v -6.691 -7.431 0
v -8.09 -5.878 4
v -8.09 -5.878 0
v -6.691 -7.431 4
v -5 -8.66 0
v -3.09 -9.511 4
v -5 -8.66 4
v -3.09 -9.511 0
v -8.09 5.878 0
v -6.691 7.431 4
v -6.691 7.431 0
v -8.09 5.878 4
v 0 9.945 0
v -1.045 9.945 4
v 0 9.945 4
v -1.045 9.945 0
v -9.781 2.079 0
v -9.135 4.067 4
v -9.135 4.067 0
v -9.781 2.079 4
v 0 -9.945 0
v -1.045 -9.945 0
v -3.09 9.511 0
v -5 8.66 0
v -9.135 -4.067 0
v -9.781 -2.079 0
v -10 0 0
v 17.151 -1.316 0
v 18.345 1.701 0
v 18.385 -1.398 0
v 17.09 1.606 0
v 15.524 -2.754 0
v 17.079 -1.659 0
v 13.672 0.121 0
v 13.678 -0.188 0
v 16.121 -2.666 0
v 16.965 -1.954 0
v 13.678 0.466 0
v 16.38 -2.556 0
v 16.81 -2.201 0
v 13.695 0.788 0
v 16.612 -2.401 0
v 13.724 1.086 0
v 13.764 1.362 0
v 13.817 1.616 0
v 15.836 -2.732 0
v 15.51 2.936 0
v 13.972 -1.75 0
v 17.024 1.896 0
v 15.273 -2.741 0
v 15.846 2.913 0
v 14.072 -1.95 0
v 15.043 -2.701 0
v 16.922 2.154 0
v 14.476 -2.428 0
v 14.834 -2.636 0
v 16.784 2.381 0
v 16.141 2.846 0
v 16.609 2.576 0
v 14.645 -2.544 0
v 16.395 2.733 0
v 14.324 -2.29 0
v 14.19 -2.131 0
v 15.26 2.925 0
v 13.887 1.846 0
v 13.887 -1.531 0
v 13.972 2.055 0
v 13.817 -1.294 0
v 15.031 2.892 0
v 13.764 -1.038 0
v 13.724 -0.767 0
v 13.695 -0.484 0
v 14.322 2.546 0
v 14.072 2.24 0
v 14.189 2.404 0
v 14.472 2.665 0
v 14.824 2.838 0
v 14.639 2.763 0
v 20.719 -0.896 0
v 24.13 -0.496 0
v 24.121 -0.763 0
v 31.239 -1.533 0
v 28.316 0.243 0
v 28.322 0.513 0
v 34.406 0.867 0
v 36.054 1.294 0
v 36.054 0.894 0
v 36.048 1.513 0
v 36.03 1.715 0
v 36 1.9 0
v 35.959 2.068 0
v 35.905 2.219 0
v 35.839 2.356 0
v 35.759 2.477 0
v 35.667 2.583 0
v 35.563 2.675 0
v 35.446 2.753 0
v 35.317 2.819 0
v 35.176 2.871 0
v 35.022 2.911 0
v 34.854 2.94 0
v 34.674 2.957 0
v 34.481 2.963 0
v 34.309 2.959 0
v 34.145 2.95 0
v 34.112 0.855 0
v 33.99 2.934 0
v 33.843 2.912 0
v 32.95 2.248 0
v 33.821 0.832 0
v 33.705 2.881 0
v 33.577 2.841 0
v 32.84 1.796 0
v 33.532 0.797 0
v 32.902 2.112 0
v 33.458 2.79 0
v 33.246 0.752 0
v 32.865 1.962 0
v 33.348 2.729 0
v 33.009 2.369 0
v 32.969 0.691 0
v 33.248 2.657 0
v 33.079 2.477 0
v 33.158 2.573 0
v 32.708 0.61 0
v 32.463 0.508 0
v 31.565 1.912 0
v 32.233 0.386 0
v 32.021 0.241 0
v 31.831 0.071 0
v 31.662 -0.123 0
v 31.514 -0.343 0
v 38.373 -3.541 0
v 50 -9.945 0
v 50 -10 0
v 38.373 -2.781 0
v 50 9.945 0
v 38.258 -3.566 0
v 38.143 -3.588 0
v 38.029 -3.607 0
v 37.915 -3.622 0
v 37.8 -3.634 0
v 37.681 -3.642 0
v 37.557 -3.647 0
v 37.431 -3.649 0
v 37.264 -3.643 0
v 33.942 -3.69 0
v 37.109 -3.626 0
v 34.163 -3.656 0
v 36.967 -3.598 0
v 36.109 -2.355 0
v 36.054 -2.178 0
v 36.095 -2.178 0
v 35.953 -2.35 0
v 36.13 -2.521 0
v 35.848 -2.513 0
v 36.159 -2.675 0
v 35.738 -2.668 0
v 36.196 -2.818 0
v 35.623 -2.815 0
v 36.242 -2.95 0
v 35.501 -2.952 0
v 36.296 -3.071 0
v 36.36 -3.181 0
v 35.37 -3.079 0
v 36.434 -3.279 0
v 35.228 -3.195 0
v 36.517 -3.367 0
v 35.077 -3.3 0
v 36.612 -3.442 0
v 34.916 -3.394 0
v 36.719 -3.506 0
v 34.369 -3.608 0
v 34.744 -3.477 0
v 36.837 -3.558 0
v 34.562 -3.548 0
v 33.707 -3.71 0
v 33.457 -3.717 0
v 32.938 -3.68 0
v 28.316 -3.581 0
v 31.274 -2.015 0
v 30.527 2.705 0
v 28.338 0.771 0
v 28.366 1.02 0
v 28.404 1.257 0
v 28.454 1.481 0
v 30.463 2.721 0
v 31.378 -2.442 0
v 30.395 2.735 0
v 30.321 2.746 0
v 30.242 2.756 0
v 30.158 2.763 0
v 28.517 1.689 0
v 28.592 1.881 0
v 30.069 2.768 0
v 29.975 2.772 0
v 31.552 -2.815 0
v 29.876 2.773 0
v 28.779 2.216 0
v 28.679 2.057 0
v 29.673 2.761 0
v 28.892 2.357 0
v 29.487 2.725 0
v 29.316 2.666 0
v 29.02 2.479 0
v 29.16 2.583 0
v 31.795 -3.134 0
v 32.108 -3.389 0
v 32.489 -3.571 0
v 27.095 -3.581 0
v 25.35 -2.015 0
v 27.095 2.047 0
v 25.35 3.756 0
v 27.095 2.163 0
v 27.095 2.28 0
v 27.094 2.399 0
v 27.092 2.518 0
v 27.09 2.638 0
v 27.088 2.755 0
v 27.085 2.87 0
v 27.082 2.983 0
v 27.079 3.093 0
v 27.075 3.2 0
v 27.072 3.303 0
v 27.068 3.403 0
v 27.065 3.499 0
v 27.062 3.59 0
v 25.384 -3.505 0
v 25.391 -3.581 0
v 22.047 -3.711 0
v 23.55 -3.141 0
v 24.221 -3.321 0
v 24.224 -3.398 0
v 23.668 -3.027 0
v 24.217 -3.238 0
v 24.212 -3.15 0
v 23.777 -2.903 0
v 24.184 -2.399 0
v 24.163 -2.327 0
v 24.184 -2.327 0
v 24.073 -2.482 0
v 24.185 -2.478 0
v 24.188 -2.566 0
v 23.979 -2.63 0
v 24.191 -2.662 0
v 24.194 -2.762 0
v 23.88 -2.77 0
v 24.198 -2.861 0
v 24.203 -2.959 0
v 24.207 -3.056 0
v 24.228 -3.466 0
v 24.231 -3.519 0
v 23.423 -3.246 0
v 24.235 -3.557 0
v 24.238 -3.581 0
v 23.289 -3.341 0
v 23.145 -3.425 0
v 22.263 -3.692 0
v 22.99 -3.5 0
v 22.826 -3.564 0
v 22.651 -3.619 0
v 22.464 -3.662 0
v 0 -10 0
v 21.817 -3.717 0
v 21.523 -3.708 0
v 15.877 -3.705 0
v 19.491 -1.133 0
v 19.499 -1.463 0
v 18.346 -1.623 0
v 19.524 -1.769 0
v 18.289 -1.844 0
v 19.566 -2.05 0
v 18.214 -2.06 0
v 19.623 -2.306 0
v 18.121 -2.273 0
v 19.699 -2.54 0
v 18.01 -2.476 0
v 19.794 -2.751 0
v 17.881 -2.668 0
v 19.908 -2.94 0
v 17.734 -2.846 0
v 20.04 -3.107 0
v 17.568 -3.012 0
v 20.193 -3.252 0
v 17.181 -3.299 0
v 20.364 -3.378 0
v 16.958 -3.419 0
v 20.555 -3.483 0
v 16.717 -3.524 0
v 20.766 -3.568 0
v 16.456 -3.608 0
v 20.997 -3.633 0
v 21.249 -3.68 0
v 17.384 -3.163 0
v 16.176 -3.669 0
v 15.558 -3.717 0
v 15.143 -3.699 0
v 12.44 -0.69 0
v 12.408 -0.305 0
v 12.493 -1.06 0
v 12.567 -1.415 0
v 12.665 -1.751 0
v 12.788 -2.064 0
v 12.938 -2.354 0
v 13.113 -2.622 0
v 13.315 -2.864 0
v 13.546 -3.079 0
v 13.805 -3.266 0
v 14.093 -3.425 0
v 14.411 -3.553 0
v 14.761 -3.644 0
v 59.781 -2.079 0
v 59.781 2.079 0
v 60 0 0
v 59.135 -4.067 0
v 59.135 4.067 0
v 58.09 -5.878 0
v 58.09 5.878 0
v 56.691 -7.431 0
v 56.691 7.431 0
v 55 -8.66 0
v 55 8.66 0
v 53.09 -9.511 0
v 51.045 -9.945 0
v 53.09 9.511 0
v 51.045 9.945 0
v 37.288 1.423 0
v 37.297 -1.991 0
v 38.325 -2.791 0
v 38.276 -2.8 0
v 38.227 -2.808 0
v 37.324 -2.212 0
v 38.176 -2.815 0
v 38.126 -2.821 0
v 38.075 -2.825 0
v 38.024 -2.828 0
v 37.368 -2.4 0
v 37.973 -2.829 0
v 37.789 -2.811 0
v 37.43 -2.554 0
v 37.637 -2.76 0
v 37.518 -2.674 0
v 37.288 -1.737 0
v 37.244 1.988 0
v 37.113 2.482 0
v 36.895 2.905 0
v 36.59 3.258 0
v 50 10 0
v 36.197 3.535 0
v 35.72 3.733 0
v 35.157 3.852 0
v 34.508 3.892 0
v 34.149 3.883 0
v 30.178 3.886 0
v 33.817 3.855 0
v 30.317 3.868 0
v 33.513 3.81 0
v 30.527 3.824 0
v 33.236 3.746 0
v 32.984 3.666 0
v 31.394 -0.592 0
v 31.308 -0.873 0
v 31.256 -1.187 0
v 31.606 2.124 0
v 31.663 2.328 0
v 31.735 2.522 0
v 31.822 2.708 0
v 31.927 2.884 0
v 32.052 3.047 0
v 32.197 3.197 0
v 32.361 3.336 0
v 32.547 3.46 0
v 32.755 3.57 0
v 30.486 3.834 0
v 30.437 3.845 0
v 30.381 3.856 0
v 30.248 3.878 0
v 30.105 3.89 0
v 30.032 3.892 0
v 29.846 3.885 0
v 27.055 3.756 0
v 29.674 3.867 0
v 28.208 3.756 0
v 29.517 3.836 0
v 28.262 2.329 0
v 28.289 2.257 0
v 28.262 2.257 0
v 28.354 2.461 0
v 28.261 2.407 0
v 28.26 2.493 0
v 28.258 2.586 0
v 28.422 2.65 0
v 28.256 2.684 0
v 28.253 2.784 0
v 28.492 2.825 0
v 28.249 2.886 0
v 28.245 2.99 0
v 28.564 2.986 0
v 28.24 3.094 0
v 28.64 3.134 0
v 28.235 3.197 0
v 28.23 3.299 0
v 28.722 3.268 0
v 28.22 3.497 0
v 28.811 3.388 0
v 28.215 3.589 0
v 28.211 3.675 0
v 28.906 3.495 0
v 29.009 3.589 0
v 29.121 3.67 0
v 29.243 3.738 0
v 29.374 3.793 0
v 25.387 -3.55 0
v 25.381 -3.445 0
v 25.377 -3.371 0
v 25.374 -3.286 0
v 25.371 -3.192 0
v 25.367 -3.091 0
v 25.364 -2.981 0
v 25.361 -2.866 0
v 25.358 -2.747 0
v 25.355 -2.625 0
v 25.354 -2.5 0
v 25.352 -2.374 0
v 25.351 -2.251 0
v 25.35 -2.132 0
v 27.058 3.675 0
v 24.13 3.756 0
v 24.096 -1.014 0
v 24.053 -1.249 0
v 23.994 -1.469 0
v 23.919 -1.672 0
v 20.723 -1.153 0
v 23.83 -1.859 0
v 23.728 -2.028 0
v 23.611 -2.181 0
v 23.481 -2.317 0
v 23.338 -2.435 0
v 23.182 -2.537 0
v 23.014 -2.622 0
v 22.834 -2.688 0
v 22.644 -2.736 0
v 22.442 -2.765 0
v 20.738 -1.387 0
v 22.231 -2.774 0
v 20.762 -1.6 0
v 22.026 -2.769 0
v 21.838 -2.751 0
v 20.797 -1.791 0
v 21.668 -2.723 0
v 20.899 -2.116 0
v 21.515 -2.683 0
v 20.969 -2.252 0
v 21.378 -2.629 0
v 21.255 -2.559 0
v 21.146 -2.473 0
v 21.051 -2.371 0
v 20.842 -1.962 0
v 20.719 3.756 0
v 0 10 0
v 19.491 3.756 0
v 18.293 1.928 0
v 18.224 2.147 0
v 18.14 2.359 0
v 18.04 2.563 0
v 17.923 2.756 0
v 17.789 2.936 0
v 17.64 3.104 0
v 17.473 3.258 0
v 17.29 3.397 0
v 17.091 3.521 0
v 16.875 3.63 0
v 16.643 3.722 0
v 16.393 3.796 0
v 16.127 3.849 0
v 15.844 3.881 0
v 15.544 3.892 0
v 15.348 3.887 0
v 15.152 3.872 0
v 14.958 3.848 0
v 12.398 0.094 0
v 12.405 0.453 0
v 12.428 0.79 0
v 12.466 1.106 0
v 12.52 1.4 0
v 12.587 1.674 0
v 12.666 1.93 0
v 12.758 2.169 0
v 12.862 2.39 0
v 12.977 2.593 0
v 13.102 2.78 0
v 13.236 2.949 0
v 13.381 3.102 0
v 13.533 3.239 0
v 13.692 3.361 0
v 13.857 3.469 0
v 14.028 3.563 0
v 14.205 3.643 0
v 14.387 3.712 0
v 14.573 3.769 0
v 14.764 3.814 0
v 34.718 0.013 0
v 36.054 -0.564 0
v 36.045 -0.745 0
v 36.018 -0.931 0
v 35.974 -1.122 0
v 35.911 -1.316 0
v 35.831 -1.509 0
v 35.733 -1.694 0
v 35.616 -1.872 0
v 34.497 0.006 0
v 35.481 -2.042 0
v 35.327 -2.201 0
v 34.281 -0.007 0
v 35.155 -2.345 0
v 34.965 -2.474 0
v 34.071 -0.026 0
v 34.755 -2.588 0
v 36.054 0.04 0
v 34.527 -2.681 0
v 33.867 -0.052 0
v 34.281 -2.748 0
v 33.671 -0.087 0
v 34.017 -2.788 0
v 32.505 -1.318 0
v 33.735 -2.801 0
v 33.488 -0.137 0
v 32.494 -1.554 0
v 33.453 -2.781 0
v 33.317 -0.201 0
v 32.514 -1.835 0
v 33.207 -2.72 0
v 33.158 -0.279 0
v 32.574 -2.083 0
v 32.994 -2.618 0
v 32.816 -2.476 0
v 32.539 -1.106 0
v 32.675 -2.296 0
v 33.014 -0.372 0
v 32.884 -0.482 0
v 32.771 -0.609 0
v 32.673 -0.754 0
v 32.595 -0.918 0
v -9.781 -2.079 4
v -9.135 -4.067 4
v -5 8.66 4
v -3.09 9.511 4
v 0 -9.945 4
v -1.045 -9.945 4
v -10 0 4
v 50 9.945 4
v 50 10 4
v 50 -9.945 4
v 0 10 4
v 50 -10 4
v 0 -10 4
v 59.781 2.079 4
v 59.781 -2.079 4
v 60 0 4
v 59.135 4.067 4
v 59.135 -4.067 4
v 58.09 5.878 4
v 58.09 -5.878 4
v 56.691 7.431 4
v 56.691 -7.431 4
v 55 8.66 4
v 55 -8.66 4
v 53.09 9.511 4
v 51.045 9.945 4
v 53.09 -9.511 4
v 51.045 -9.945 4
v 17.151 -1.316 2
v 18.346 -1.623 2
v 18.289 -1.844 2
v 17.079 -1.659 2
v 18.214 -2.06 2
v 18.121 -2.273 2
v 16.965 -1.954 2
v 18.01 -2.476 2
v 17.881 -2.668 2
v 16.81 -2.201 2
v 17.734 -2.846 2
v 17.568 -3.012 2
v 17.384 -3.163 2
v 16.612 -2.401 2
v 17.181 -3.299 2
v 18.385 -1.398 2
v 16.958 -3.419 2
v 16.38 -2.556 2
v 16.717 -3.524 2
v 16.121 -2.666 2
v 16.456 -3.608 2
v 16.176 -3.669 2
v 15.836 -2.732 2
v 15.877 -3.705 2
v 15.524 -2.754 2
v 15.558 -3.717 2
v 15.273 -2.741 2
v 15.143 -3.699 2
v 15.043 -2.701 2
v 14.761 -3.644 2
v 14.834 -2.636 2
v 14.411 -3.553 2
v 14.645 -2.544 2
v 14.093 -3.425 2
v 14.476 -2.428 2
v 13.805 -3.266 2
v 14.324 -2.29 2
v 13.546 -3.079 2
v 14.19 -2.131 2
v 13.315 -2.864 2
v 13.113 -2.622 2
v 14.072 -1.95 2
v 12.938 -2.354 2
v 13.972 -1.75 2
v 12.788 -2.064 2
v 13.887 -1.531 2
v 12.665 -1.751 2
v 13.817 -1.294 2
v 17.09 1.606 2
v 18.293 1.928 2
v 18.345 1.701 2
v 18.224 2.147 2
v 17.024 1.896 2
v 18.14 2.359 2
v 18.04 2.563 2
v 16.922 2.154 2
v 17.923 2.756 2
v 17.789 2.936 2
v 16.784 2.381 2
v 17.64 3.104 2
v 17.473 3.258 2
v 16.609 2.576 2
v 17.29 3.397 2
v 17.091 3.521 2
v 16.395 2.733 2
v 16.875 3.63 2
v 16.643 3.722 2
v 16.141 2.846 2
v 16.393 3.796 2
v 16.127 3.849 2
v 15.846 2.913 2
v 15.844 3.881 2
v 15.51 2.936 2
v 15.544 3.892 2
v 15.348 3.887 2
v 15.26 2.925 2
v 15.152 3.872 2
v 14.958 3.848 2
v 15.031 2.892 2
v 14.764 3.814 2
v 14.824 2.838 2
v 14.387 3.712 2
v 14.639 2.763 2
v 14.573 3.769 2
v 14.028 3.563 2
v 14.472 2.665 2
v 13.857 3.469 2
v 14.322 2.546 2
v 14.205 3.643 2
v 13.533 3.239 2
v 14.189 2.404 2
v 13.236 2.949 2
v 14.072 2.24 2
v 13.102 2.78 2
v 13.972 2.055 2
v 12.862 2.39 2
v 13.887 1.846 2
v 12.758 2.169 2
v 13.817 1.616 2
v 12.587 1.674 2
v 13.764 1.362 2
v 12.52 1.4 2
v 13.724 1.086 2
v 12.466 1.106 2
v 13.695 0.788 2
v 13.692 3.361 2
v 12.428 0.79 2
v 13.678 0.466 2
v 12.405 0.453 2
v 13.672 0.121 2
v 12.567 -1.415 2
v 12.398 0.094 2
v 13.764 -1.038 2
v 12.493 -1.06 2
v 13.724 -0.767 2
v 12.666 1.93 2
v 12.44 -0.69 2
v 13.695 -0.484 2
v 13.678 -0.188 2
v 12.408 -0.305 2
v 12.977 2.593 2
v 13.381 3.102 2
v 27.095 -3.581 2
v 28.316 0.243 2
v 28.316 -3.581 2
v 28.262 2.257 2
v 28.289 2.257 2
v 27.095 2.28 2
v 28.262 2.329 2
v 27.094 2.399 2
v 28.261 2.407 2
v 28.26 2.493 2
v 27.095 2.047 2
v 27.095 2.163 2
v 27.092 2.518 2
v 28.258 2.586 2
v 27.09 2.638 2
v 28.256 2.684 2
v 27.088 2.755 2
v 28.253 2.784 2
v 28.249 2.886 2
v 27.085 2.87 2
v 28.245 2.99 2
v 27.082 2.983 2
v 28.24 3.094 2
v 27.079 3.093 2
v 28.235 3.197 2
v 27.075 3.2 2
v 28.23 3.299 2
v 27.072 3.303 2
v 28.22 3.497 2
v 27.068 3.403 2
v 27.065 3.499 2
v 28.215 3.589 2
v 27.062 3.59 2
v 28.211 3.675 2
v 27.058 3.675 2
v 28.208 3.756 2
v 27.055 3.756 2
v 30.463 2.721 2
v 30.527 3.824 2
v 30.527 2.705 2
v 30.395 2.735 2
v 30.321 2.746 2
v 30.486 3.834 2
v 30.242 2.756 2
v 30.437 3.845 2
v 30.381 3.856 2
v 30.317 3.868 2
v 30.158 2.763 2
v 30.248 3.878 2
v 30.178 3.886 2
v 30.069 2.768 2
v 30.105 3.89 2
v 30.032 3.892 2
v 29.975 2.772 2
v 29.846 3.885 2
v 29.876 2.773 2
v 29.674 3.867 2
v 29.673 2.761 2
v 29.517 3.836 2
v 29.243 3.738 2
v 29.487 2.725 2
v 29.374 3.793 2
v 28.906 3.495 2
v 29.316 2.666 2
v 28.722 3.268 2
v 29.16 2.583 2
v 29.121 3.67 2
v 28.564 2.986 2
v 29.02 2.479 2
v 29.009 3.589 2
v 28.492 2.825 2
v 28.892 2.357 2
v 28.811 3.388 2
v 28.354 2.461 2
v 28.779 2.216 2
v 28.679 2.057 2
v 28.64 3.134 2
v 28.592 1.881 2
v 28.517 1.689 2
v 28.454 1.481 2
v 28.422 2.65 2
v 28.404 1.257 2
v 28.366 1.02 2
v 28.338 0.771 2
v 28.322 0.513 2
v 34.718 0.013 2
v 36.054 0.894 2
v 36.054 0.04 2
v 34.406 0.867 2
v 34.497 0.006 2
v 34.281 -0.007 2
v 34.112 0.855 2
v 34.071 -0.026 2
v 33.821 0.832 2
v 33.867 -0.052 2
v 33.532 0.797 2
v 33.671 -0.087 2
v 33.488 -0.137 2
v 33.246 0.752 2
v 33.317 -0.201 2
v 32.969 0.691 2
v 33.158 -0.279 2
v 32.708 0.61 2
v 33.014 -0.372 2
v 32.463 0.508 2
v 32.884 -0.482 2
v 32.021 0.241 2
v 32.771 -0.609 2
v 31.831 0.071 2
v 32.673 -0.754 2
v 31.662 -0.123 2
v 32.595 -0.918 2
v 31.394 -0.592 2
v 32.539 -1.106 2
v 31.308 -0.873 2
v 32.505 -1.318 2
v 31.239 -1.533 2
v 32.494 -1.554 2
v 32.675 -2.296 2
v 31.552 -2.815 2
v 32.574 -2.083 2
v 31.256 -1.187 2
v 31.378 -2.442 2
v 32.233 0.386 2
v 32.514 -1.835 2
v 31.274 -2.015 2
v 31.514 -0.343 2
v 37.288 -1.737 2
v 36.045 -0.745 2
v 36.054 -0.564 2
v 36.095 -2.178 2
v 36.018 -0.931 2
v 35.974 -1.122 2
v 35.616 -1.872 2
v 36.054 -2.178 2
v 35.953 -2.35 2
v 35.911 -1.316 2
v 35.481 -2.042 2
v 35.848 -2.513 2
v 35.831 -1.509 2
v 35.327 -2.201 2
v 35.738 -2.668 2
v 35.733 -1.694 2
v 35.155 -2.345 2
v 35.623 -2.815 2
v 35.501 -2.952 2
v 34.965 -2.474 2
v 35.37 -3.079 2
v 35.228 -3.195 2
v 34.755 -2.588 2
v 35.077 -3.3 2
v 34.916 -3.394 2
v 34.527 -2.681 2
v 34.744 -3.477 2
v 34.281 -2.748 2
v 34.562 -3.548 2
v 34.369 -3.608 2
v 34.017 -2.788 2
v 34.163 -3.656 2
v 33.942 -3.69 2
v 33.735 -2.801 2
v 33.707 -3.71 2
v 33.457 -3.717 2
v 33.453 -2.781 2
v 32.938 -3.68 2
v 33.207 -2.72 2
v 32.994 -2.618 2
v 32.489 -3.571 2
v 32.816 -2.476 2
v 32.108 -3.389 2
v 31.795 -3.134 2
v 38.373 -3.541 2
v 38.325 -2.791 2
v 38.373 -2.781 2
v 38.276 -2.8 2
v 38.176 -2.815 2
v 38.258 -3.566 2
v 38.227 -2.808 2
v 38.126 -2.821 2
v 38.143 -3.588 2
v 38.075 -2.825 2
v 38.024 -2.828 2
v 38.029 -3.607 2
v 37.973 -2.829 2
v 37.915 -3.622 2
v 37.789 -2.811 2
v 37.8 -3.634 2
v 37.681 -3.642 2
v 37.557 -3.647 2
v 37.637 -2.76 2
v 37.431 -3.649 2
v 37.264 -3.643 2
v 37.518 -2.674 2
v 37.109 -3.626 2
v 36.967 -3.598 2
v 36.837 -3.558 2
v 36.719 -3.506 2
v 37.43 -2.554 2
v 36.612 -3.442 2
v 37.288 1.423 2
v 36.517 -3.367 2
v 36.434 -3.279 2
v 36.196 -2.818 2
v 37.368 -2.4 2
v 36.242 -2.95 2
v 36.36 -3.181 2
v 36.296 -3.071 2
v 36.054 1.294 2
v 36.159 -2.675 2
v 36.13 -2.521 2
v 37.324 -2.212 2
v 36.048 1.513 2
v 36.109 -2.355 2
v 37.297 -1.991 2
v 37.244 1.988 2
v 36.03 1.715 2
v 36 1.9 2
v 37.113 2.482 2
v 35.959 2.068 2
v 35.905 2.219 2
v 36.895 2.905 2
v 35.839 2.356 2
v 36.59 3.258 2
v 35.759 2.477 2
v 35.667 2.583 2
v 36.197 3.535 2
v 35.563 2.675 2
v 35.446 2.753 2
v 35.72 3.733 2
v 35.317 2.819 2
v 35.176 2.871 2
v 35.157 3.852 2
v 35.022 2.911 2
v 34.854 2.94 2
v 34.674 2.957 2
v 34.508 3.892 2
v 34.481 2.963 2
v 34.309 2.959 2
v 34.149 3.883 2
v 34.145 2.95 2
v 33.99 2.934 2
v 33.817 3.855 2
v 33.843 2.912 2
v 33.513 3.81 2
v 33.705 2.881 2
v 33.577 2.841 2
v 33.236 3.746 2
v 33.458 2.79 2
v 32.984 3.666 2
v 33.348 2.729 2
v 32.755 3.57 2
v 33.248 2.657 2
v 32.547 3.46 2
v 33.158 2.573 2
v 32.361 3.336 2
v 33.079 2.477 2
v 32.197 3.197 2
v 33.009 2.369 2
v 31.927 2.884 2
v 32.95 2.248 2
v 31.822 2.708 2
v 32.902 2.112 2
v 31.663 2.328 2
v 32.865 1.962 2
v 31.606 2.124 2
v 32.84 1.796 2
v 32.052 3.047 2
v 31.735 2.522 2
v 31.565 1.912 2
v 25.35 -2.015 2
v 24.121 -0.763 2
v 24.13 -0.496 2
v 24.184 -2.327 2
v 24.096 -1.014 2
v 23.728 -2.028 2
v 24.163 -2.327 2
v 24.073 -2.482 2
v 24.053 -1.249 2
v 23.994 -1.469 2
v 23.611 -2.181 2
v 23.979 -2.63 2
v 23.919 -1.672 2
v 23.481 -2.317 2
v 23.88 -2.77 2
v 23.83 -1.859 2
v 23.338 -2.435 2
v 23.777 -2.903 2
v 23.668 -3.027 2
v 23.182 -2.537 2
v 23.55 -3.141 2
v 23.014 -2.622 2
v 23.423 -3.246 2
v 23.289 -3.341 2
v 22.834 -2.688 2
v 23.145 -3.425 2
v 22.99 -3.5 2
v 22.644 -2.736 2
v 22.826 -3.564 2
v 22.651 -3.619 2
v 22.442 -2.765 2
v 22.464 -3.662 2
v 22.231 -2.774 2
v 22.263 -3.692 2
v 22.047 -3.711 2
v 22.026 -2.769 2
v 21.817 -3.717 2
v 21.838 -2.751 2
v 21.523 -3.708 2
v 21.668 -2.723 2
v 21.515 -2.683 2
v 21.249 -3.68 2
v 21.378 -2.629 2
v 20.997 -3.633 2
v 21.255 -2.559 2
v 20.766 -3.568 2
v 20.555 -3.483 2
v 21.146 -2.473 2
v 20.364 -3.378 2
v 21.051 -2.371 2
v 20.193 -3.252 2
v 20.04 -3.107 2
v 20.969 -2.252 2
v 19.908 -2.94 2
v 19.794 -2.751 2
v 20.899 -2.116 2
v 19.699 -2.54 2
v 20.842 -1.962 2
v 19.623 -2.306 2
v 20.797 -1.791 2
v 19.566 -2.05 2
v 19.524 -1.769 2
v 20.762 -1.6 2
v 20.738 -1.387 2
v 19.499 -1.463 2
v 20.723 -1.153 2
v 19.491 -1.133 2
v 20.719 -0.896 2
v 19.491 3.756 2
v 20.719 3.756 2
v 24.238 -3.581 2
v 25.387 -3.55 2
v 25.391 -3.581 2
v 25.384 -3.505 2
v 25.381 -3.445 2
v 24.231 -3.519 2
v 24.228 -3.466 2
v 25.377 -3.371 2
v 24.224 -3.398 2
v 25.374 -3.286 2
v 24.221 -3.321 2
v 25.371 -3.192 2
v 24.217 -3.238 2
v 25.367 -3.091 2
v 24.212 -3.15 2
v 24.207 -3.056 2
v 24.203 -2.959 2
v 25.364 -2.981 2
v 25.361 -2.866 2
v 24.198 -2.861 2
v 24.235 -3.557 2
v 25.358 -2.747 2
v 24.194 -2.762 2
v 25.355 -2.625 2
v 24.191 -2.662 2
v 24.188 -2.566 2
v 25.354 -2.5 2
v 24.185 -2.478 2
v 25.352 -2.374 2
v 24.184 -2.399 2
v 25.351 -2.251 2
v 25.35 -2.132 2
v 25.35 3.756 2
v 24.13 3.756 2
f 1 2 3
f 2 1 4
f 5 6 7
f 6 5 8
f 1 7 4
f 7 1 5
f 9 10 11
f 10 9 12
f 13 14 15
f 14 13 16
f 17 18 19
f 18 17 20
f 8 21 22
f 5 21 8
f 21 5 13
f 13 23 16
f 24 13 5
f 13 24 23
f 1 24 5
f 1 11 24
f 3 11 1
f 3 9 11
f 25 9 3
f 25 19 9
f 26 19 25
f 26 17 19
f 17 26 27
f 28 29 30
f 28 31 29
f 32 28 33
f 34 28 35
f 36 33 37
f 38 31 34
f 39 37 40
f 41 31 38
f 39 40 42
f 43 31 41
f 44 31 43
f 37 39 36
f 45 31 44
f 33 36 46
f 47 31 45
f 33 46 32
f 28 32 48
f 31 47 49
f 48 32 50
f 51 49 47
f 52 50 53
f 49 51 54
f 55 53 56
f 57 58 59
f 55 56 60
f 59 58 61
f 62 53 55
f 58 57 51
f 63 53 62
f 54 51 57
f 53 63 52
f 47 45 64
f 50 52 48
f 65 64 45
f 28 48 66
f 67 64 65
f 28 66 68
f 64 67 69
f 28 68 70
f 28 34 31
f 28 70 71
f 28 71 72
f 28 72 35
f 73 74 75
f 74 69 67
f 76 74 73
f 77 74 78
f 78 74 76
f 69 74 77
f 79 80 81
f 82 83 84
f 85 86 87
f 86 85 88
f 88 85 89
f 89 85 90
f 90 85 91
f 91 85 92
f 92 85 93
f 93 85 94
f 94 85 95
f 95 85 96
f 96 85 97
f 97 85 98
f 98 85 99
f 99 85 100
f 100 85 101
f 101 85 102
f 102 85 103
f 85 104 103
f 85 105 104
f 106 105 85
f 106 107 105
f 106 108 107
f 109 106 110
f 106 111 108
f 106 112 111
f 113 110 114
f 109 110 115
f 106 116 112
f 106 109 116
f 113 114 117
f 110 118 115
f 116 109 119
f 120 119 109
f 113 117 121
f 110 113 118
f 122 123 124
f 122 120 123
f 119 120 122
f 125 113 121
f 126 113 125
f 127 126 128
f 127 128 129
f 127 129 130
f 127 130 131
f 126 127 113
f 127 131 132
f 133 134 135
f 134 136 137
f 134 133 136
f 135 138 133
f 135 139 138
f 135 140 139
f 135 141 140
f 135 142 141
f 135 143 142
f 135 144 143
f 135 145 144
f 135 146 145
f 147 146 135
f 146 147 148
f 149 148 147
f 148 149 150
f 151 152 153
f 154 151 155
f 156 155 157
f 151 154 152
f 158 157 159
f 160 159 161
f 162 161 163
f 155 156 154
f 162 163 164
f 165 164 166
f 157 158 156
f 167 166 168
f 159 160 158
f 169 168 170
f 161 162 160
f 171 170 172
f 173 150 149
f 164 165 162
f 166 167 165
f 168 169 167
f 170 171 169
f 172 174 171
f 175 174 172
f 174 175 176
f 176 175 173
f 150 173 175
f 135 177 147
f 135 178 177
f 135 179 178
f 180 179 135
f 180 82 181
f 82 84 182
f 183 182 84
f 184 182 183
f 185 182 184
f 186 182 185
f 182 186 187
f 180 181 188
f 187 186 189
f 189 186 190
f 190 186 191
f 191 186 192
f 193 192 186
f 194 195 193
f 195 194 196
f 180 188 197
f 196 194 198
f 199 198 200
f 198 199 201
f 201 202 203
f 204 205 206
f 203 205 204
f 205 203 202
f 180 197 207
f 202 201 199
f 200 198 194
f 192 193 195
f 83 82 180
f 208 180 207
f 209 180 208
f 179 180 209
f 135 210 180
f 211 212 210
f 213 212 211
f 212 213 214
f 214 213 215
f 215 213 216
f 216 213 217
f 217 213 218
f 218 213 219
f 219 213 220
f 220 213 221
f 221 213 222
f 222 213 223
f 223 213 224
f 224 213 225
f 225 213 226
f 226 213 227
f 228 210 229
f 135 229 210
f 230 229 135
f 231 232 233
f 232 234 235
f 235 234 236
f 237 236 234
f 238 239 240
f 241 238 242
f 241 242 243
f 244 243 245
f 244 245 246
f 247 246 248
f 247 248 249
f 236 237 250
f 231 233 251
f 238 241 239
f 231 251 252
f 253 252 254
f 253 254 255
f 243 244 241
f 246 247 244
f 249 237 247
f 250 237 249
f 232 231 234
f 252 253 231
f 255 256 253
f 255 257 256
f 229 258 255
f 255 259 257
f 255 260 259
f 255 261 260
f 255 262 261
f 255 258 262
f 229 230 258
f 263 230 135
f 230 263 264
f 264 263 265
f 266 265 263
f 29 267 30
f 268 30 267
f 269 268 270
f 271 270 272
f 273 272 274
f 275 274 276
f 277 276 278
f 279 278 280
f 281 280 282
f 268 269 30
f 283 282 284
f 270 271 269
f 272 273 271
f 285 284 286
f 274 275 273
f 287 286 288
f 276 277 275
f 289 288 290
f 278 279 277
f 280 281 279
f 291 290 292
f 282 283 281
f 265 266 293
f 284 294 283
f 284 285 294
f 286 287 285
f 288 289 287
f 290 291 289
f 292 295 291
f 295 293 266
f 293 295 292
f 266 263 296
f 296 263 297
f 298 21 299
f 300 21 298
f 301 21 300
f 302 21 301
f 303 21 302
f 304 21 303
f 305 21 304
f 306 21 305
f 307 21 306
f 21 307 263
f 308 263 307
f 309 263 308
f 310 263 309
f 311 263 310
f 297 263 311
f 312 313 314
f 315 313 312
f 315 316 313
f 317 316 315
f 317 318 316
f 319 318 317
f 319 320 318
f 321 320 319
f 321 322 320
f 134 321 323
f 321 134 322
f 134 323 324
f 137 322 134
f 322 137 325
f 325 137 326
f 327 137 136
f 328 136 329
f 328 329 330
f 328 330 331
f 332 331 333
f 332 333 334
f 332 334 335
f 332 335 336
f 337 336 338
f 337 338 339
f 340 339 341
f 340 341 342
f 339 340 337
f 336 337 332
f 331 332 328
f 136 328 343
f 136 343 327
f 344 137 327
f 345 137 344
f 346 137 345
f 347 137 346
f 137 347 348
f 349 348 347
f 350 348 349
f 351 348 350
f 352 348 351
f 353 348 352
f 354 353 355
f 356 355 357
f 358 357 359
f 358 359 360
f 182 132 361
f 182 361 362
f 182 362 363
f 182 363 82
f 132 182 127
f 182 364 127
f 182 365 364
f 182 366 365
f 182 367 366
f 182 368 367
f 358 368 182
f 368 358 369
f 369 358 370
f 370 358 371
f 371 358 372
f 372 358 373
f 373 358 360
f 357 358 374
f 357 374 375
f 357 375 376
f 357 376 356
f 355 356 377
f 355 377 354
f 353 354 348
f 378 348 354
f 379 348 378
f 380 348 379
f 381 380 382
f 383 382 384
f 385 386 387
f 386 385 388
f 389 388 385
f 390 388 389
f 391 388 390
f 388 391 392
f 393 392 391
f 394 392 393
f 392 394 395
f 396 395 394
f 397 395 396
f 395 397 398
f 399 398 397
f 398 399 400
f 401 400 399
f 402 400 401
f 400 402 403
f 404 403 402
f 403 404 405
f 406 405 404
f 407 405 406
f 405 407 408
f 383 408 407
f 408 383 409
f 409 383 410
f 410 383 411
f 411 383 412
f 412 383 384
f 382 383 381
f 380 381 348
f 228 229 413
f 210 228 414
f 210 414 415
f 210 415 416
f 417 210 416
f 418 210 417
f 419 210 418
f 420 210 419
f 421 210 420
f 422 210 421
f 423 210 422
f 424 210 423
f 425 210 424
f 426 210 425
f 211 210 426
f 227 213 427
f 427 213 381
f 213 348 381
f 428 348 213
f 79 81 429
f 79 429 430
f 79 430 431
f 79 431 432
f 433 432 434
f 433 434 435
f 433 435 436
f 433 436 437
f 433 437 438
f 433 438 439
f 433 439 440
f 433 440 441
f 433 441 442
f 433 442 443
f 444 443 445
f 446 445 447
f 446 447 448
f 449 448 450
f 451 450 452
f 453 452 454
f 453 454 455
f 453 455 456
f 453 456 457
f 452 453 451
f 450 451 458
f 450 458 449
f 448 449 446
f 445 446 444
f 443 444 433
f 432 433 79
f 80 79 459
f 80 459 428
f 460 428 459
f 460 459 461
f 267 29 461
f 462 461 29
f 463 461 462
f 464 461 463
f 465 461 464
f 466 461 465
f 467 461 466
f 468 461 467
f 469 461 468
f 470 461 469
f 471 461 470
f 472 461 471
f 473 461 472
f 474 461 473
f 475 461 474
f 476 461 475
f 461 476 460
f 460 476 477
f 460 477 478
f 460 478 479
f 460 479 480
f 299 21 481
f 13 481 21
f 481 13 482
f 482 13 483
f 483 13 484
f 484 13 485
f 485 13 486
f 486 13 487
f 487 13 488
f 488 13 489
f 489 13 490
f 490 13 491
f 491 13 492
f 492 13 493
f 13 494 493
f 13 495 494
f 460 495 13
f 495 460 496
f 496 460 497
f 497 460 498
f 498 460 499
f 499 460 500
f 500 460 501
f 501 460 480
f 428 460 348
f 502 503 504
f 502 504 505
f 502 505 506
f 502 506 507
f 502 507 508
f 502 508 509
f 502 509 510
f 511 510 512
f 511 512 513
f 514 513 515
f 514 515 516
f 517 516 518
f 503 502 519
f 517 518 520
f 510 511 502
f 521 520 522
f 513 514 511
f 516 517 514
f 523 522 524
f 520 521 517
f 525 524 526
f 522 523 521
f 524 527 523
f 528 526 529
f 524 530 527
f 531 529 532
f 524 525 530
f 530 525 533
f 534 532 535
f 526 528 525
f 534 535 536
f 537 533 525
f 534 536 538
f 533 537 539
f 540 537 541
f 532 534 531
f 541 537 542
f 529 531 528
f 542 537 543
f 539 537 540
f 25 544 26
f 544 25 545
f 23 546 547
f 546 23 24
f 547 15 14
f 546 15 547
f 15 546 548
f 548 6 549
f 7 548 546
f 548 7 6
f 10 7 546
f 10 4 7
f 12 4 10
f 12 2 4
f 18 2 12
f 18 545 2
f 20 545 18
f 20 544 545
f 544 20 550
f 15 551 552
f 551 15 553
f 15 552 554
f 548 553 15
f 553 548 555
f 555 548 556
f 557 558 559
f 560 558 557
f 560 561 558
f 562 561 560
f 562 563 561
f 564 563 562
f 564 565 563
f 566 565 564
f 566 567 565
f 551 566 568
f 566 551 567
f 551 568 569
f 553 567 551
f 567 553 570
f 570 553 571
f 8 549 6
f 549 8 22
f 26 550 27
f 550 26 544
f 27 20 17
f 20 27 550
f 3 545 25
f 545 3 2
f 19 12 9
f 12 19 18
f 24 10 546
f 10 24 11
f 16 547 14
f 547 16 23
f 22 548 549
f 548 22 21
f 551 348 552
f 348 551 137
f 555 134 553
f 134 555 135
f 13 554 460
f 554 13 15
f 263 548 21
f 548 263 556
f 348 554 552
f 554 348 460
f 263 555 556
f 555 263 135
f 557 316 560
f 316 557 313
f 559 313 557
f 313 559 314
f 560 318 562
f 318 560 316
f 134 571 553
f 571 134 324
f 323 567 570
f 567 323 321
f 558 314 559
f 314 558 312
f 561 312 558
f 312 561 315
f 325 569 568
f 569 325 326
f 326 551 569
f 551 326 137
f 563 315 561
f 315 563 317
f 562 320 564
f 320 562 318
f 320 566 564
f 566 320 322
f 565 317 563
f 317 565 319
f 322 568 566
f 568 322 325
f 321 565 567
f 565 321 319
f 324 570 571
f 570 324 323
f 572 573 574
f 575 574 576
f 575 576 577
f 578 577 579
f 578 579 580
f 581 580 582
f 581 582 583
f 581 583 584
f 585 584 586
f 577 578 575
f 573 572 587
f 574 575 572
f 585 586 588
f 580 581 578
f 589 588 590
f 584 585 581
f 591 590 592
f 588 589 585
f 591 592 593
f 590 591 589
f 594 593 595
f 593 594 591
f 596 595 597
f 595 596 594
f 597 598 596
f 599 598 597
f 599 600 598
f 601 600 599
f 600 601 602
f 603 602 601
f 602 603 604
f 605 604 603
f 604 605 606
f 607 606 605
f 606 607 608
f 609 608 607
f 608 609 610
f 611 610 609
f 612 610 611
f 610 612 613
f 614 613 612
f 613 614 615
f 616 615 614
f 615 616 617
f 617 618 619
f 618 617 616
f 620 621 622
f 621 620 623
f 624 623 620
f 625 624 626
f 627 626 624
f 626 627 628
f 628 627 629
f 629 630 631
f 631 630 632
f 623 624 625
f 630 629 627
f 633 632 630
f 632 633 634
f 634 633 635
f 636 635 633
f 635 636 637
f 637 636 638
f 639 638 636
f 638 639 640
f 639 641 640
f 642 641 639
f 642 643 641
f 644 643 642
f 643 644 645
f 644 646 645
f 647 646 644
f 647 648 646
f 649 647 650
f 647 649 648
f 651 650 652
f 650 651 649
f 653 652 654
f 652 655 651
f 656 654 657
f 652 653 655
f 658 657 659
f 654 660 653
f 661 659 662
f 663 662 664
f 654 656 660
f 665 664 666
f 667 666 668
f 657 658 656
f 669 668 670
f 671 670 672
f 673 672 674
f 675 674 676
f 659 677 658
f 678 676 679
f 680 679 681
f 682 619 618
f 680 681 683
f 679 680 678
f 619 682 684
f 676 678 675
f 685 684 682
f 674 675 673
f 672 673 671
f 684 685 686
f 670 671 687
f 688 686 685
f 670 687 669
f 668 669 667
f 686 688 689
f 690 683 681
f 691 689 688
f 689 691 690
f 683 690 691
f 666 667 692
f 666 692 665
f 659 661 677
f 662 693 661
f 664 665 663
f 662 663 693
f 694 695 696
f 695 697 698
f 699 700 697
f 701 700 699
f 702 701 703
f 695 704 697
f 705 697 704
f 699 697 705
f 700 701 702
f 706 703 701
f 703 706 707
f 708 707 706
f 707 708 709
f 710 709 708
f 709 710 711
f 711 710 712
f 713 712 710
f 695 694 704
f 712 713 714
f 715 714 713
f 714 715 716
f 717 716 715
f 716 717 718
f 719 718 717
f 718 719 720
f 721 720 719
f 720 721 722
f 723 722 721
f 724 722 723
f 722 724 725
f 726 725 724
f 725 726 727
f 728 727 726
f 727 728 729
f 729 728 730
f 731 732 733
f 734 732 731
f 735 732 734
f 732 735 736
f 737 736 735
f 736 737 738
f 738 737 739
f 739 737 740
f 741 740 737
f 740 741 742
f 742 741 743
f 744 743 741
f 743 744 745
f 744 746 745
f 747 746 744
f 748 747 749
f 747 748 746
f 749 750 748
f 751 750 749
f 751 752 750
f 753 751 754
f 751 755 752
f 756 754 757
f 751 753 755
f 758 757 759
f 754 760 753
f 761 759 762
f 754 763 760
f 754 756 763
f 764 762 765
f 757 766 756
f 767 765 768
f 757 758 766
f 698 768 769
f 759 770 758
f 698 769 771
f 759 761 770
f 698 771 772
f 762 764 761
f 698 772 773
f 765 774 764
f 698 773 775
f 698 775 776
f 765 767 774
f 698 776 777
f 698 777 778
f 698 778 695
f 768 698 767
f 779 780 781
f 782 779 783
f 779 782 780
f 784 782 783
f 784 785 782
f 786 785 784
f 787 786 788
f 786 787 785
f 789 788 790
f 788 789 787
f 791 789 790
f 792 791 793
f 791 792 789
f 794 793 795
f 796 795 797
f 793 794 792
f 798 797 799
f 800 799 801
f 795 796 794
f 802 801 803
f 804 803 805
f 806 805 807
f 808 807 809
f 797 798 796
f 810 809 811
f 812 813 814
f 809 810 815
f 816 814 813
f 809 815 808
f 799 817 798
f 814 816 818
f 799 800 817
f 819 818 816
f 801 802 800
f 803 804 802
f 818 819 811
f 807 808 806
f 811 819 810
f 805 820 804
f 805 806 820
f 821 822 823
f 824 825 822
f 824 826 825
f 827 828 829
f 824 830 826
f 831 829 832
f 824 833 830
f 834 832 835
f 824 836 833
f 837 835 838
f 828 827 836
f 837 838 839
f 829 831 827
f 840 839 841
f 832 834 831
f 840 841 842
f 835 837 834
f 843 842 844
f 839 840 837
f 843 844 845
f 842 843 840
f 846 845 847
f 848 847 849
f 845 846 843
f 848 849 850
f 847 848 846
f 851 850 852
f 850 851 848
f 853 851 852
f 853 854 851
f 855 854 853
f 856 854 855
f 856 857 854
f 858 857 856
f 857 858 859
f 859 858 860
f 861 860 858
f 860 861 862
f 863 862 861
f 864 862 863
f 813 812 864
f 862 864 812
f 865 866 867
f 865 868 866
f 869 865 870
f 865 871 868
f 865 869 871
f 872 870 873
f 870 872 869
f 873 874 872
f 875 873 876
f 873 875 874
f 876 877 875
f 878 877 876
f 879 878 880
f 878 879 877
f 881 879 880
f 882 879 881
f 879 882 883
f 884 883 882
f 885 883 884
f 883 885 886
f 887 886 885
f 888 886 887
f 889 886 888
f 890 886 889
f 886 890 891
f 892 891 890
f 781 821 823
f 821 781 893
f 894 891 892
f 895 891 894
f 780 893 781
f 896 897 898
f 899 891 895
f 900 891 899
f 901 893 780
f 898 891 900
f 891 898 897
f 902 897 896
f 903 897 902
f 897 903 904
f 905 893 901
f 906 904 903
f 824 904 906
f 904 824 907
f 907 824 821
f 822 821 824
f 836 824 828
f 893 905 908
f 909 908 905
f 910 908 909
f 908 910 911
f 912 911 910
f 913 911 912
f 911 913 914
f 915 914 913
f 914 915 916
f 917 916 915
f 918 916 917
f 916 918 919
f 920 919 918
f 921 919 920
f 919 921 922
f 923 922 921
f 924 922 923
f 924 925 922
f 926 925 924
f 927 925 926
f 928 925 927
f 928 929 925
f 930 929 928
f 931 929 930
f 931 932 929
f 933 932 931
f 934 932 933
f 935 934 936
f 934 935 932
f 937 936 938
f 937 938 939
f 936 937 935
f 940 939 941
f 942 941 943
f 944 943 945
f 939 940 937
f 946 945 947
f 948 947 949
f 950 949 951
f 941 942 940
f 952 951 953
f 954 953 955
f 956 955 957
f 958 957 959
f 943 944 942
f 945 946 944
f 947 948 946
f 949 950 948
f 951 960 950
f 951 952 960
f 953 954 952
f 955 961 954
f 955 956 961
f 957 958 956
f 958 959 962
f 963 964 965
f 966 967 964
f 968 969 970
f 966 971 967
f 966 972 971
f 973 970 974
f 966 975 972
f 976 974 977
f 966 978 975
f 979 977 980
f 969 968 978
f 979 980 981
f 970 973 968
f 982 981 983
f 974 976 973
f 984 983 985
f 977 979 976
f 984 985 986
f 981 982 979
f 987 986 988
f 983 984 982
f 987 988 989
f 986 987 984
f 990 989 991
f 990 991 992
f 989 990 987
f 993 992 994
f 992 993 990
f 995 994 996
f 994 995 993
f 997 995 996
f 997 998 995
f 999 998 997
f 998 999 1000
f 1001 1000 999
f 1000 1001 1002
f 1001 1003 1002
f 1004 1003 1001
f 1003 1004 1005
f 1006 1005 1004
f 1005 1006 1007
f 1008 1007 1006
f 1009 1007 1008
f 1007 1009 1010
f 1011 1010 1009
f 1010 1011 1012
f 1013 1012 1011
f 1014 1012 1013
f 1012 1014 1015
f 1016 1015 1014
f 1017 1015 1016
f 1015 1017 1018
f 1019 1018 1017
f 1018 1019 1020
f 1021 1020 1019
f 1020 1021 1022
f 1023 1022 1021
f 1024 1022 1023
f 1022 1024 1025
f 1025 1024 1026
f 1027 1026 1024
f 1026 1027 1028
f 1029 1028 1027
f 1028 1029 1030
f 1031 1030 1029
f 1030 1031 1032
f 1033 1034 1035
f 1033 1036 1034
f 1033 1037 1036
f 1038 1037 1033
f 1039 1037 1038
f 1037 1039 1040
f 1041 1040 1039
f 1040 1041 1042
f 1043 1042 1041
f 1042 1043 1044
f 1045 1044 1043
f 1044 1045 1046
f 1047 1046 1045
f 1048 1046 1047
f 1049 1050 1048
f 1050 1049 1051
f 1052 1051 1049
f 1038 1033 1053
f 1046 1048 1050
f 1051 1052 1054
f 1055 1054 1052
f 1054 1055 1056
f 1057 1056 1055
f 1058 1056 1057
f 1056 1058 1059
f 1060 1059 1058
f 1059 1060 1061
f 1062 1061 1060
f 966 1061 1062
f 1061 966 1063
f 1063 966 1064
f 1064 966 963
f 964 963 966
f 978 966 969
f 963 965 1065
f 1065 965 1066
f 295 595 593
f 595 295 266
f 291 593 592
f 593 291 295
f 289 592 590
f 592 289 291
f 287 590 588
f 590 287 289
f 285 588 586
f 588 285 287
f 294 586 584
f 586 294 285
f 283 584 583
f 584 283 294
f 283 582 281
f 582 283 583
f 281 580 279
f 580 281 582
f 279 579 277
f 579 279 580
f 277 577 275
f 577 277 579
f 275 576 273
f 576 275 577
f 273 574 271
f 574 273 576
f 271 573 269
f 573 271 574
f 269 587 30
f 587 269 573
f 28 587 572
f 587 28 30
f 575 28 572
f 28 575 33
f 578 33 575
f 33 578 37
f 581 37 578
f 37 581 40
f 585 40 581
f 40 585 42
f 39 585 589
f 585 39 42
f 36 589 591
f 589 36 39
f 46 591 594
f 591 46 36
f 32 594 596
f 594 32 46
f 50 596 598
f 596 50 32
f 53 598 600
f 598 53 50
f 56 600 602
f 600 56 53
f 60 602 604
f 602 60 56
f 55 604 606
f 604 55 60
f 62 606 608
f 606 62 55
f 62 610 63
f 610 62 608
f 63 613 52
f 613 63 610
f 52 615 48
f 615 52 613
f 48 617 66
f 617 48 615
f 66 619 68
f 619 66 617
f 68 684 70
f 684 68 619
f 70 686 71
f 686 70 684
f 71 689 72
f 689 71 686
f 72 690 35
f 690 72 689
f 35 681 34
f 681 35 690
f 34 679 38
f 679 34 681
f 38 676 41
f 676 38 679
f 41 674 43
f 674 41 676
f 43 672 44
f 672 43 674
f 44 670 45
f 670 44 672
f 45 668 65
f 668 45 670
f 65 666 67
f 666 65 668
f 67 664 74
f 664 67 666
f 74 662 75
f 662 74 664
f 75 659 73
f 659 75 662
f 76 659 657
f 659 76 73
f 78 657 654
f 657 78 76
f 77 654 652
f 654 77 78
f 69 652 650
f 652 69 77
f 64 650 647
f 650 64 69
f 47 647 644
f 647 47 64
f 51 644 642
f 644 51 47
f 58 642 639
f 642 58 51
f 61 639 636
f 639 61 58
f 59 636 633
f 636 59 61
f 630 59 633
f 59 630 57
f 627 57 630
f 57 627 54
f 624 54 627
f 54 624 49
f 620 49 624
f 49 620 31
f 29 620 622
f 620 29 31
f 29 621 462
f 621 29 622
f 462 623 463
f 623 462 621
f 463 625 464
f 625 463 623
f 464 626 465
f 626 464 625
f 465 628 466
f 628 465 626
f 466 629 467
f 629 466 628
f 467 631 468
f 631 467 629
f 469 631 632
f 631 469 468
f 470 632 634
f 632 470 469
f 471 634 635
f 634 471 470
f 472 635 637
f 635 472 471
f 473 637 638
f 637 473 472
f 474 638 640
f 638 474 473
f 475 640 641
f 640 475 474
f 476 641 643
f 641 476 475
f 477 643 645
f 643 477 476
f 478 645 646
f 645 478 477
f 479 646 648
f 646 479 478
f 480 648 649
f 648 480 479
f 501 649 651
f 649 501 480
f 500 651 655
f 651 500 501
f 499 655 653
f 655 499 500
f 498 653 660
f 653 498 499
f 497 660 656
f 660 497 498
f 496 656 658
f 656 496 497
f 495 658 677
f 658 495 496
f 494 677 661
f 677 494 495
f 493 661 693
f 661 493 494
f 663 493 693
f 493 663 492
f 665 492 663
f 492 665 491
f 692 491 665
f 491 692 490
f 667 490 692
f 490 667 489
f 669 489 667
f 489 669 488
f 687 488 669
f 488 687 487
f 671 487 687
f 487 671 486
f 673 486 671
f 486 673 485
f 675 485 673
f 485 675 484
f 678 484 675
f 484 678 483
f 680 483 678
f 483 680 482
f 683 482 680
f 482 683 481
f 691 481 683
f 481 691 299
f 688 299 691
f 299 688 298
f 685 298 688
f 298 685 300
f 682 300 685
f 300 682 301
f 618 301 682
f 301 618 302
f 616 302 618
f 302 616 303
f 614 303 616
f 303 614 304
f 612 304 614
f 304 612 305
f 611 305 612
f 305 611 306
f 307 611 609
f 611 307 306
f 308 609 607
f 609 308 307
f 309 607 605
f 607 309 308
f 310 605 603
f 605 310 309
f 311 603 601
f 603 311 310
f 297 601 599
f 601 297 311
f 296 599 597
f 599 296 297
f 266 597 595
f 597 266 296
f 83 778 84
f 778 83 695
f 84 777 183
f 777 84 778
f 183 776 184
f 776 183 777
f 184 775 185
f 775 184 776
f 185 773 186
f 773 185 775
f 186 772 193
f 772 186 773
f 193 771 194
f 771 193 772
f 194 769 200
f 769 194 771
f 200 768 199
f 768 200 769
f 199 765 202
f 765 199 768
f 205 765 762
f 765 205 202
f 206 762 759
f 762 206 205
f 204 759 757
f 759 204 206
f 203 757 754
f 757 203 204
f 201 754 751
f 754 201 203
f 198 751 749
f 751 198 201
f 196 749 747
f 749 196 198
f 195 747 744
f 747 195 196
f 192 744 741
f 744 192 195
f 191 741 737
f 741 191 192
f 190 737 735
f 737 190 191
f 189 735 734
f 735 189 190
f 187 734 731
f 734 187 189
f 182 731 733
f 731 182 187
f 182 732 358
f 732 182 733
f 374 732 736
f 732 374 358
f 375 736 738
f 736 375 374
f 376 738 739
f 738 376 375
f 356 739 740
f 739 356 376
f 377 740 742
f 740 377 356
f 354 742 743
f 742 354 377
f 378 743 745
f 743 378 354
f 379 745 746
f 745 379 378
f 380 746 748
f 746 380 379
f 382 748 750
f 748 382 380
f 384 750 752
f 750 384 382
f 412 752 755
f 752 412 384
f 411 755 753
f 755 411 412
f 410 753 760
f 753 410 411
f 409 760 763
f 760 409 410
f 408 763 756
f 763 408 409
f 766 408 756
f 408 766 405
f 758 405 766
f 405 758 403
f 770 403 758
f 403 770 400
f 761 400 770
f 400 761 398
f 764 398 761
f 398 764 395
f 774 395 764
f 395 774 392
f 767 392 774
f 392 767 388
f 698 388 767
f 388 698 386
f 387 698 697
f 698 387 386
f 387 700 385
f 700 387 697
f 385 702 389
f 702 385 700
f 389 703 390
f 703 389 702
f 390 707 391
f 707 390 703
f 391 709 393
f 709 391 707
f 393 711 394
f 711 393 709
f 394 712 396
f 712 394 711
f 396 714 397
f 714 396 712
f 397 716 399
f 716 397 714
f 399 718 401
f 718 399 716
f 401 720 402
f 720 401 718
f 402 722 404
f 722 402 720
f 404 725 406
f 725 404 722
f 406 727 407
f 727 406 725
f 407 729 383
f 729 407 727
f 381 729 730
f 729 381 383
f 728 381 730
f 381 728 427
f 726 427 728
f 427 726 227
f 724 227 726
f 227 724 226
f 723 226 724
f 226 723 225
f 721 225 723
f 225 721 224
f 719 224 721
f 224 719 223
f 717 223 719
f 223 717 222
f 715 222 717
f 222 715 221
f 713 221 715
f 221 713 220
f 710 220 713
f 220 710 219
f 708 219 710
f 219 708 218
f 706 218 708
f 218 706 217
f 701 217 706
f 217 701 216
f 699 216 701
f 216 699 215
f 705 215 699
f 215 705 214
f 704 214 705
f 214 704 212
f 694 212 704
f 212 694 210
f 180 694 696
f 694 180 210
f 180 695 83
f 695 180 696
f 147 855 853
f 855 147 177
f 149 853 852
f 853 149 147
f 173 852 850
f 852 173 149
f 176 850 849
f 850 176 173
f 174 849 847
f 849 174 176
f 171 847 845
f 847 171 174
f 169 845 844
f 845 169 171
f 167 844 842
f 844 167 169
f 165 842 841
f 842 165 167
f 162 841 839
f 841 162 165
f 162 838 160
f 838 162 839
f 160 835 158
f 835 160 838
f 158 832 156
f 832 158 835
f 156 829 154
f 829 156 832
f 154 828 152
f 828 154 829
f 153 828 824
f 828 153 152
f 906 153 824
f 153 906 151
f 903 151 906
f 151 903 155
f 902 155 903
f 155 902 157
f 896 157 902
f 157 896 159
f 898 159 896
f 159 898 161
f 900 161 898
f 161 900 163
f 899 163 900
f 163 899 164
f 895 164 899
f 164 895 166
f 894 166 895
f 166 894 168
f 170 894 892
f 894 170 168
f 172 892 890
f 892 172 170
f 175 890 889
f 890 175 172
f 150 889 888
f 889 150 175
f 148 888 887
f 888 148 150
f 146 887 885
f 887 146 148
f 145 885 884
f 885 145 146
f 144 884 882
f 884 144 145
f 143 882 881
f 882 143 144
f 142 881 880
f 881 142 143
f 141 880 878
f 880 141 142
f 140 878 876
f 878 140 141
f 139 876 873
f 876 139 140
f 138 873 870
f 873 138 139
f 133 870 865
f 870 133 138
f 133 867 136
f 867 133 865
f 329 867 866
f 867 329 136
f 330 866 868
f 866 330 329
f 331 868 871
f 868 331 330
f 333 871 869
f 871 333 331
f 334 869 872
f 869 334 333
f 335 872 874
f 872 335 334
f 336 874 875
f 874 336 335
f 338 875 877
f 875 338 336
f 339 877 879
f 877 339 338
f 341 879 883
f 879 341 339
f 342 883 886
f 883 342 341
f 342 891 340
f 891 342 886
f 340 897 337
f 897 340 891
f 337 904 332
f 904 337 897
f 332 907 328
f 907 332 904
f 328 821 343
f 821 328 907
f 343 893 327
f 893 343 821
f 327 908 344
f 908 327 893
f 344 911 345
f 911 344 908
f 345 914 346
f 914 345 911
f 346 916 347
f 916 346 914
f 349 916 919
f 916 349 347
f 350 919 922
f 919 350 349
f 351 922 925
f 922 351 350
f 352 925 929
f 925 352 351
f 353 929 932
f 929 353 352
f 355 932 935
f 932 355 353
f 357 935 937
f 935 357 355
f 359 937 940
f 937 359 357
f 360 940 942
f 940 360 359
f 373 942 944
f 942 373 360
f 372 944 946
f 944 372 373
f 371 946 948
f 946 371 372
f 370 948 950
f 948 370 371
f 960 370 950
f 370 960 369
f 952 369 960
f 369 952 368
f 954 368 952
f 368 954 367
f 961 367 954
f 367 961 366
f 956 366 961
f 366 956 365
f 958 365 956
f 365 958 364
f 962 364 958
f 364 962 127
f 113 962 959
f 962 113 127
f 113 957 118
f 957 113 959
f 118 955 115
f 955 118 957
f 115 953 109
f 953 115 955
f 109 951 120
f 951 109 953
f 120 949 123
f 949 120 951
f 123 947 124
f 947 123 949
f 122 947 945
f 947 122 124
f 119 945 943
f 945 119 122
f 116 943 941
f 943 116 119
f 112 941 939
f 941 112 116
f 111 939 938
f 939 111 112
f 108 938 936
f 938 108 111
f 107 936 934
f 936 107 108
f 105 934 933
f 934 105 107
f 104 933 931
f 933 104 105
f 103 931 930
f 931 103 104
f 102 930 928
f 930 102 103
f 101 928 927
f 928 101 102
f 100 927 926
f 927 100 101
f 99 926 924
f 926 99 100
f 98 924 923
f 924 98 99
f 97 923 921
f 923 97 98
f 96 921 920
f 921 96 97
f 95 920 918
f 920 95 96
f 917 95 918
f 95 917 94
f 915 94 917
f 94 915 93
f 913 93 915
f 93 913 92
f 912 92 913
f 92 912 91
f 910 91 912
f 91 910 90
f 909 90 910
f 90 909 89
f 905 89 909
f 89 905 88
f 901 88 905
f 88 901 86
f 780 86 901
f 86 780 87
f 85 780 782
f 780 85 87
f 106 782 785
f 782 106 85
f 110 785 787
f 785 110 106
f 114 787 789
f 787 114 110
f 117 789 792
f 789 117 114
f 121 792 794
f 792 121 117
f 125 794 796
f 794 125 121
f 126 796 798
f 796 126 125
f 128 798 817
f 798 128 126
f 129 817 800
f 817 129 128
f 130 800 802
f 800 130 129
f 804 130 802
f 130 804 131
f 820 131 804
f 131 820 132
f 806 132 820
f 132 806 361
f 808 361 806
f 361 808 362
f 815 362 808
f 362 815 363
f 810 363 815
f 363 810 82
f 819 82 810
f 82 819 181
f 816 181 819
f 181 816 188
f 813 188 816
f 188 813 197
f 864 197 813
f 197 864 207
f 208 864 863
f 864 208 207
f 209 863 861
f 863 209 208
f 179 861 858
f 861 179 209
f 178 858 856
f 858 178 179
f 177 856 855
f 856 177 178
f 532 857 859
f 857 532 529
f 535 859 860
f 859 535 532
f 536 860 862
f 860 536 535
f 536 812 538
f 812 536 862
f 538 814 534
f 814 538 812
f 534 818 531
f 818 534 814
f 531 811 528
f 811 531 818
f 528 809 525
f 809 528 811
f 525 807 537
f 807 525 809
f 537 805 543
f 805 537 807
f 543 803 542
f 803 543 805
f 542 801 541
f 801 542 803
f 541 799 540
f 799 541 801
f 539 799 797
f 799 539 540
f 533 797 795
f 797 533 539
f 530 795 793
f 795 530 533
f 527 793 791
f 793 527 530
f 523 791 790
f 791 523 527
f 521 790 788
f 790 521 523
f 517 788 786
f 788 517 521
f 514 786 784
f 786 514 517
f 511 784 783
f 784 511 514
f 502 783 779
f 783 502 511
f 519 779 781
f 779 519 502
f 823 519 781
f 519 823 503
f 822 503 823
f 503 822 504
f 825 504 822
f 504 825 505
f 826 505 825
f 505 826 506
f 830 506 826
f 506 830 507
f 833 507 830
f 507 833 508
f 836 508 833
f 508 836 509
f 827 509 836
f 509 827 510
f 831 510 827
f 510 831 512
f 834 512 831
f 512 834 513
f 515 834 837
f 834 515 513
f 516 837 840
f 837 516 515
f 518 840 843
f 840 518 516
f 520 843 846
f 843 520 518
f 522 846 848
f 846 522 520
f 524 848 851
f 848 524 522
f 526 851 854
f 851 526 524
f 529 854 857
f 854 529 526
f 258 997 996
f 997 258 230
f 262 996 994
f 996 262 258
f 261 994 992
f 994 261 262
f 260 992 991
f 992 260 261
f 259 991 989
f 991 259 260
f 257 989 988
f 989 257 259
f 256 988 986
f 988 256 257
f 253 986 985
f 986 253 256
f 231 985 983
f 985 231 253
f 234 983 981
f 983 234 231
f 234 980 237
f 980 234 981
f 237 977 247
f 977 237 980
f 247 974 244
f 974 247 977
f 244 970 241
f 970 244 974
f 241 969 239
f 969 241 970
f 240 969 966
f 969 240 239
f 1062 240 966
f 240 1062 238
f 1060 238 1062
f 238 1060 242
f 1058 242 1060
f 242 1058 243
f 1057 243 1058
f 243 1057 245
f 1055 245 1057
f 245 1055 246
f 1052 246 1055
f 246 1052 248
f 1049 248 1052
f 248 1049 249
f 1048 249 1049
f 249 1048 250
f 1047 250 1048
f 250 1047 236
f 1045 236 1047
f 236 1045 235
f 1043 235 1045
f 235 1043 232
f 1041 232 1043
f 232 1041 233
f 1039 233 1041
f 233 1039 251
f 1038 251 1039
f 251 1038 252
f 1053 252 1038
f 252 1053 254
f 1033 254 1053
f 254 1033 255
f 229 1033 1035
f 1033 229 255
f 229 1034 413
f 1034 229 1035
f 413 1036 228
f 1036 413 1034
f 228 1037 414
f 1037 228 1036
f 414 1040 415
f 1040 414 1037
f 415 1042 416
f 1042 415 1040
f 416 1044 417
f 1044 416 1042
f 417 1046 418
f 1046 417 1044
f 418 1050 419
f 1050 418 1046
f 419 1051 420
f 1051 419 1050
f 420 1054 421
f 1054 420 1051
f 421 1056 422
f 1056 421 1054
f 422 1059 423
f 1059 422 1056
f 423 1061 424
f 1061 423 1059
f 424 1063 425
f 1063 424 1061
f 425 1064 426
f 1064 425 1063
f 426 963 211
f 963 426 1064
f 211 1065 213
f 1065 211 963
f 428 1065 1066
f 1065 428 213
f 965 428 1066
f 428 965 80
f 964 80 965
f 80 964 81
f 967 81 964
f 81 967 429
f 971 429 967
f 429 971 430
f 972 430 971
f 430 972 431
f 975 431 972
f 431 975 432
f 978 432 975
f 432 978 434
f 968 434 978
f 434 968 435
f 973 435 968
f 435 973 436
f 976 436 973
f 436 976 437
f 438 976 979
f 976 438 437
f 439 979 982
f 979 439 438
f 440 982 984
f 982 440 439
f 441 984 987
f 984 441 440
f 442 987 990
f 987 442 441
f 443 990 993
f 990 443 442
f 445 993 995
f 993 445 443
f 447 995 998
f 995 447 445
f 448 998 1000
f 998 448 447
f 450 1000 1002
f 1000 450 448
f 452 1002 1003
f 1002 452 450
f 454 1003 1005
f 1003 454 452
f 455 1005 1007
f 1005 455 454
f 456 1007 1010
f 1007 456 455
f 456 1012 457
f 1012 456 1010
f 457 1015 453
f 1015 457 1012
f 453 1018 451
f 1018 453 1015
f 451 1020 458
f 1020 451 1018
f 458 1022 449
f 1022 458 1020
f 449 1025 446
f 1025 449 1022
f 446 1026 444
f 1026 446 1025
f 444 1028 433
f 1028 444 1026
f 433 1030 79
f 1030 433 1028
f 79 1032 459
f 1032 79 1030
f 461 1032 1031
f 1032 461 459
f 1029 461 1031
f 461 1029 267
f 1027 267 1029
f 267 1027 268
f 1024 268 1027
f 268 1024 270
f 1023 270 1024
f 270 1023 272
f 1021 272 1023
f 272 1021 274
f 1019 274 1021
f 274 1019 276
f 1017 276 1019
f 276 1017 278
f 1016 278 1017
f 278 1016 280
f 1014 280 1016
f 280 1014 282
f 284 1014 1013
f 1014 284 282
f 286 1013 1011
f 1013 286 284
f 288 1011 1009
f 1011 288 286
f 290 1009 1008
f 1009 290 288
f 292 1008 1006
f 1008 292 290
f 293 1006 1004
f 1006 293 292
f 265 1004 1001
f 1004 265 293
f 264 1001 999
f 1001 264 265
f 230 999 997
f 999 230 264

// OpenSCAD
height = 20;
thickness = 4;
length = 50;
label = "cura";

difference() {
	union() {
		cylinder(r=height / 2, h=thickness);
		translate([0, -height / 2, 0]) {
			cube([length, height, thickness]);
		}
		translate([length, 0, 0]) {
			cylinder(r=height / 2, h=thickness);
		}
	}
	translate([length / 2, 0, 0]) {
		linear_extrude(height=thickness / 2) {
			text(label, halign="center", valign="center");
		}
	}
}
